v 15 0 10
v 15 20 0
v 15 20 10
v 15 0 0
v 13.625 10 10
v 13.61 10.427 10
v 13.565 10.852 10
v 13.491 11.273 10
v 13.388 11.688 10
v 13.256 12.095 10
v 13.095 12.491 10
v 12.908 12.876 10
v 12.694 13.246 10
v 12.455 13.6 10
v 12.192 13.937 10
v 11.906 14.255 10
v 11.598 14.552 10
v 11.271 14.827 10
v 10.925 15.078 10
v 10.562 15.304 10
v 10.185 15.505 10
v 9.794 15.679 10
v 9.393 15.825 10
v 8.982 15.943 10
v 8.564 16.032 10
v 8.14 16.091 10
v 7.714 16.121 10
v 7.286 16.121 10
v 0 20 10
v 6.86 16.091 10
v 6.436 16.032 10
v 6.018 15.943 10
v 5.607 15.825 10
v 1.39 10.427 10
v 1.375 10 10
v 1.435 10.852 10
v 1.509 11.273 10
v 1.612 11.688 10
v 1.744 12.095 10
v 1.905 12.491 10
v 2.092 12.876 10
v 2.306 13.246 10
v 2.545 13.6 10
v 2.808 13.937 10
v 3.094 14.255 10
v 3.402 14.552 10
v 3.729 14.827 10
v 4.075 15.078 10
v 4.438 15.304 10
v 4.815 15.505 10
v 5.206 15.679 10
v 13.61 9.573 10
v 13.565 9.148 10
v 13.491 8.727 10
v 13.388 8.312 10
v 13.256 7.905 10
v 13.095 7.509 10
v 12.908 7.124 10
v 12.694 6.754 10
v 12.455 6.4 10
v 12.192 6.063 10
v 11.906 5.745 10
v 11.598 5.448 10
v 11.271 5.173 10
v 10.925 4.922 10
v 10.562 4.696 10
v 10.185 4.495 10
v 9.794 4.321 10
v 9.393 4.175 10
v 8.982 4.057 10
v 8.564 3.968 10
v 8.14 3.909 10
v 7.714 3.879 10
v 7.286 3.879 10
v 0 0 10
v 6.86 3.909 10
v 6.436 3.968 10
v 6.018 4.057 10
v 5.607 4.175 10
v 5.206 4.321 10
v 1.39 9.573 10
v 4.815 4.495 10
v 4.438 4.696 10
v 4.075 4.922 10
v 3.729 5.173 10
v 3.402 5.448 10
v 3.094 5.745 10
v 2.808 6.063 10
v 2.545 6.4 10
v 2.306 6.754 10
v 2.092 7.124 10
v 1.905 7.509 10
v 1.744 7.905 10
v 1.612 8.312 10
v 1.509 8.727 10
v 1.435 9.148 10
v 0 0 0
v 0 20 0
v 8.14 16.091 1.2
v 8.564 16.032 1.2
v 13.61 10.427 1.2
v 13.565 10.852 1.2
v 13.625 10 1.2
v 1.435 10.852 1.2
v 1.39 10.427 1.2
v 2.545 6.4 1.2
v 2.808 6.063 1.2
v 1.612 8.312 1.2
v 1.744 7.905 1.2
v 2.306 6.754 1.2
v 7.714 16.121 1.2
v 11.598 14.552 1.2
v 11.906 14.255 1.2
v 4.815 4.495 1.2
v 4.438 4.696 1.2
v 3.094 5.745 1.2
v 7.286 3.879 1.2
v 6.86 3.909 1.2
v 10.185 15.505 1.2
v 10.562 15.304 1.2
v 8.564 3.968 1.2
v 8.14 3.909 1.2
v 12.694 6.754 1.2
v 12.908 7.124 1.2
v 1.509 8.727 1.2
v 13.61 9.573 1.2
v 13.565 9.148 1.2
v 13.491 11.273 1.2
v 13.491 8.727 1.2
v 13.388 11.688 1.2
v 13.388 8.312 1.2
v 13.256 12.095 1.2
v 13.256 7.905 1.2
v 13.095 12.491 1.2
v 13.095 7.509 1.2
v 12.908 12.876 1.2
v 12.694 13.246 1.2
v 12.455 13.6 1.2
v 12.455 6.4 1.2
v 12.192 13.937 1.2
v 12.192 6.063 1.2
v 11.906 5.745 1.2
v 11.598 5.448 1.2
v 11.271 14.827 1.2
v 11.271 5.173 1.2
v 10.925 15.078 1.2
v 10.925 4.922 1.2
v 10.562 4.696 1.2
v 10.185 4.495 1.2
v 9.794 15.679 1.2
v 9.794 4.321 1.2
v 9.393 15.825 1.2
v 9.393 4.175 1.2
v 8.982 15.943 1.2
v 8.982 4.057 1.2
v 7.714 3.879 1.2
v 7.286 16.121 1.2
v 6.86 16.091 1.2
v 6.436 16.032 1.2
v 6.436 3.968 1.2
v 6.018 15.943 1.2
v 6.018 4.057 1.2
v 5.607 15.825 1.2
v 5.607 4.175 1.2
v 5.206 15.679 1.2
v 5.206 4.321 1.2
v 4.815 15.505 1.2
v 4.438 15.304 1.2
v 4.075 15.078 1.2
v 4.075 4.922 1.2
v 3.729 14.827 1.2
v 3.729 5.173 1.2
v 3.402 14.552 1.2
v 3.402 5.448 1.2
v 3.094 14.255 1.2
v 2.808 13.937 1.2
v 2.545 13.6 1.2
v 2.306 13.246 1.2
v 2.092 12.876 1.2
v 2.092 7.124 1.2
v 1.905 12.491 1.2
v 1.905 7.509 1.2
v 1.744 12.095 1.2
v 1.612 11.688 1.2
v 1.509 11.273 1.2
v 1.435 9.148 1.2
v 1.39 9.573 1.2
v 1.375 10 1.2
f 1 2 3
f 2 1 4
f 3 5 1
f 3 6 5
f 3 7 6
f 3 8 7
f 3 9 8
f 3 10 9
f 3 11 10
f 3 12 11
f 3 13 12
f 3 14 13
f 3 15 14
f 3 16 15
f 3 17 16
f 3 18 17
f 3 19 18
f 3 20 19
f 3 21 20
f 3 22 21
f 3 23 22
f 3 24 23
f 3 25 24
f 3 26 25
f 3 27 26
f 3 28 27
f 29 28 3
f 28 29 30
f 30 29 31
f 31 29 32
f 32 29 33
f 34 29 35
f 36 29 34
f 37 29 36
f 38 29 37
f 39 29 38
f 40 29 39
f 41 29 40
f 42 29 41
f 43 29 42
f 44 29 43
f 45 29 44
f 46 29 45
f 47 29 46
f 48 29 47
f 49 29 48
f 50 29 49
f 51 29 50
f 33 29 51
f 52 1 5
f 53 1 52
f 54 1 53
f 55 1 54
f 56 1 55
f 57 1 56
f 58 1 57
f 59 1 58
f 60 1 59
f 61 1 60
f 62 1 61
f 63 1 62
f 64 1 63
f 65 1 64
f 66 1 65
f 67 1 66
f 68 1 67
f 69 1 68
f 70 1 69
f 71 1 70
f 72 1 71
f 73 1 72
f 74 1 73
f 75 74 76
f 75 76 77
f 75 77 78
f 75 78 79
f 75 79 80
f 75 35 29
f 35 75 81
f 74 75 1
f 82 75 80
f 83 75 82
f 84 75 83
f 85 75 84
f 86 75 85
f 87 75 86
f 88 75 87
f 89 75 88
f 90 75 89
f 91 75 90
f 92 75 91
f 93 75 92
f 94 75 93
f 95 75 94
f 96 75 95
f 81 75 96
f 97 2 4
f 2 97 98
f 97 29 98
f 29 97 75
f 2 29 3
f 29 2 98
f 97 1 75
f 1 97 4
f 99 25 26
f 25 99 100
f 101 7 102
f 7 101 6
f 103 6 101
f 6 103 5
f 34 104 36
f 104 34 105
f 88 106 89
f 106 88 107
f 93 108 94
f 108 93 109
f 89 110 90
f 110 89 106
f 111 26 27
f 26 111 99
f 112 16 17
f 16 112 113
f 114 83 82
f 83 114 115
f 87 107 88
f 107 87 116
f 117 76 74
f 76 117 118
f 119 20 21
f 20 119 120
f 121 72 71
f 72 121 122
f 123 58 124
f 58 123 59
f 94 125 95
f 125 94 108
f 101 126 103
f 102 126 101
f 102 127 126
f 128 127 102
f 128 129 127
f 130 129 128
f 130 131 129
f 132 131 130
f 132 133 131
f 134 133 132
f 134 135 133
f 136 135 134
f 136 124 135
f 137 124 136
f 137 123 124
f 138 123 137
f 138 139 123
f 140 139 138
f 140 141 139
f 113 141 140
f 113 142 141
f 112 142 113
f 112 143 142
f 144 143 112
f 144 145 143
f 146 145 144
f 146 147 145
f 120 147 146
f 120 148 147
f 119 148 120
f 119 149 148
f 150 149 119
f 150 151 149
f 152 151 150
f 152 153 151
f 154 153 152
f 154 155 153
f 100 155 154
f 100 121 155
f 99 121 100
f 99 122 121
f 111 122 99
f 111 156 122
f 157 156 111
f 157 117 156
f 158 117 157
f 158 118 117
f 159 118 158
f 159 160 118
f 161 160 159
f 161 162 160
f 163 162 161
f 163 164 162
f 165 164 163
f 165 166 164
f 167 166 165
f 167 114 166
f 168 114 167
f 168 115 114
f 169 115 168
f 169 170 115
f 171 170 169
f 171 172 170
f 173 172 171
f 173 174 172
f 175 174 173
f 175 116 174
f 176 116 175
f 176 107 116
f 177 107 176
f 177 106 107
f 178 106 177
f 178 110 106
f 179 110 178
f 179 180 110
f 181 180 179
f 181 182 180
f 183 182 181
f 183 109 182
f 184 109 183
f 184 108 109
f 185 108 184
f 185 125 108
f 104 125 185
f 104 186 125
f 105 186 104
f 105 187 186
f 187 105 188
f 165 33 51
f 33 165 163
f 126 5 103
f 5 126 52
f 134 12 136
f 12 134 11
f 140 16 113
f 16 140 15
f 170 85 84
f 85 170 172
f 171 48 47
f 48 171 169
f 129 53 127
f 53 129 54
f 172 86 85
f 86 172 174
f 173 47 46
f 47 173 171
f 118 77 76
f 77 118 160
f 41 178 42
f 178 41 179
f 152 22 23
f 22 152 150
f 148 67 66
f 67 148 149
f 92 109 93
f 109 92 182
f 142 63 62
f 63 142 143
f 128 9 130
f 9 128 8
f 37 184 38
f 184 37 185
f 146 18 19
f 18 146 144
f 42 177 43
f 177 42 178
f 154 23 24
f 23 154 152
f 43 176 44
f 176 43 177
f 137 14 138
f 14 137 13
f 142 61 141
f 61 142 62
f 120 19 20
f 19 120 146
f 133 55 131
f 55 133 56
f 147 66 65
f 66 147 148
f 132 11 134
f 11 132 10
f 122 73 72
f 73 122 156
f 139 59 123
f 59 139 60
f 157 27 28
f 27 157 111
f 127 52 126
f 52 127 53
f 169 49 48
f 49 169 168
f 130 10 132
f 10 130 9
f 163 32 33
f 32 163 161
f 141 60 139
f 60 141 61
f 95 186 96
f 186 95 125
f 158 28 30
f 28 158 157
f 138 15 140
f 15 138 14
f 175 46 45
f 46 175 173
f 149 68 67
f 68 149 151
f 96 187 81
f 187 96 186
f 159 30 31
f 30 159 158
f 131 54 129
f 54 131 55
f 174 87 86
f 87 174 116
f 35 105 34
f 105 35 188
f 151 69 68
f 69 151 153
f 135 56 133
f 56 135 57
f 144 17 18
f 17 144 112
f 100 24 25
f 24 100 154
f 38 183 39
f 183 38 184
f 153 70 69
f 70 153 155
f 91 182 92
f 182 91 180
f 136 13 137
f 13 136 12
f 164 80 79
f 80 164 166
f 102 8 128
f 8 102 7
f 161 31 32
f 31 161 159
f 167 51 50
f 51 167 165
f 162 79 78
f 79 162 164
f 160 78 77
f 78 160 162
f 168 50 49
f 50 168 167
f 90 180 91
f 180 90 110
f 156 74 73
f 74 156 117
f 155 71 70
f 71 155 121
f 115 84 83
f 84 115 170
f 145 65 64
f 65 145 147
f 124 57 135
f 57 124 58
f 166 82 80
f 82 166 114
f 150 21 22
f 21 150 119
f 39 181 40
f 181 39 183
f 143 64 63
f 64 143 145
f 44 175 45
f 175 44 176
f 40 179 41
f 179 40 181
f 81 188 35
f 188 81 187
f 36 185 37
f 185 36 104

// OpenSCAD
// file: _common.scad
$fa=4; // default minimum facet angle is now 0.5
$fs=0.05; // default minimum facet size is now 0.05 mm

innerRad = 80/2;
outerRad = 199/2;
depth = 60;
height = 61.5;

m3TapRad = 1.3;
screwHoleXDistance = 4;
screwHoleYDistance = 8.25;

detentRad = 3.3/2;

wallThickness = 1.2;

fingerHoleRad = 10;

holeRad = 55.25/2;
holeRadOffset = .05;

dowelRad = 12.25 / 2;
// main file
include <_common.scad>;

difference() {
  cube([15, 20, 10]);
  translate([7.5, 10, wallThickness]) cylinder(r = dowelRad, h = 10);
}
